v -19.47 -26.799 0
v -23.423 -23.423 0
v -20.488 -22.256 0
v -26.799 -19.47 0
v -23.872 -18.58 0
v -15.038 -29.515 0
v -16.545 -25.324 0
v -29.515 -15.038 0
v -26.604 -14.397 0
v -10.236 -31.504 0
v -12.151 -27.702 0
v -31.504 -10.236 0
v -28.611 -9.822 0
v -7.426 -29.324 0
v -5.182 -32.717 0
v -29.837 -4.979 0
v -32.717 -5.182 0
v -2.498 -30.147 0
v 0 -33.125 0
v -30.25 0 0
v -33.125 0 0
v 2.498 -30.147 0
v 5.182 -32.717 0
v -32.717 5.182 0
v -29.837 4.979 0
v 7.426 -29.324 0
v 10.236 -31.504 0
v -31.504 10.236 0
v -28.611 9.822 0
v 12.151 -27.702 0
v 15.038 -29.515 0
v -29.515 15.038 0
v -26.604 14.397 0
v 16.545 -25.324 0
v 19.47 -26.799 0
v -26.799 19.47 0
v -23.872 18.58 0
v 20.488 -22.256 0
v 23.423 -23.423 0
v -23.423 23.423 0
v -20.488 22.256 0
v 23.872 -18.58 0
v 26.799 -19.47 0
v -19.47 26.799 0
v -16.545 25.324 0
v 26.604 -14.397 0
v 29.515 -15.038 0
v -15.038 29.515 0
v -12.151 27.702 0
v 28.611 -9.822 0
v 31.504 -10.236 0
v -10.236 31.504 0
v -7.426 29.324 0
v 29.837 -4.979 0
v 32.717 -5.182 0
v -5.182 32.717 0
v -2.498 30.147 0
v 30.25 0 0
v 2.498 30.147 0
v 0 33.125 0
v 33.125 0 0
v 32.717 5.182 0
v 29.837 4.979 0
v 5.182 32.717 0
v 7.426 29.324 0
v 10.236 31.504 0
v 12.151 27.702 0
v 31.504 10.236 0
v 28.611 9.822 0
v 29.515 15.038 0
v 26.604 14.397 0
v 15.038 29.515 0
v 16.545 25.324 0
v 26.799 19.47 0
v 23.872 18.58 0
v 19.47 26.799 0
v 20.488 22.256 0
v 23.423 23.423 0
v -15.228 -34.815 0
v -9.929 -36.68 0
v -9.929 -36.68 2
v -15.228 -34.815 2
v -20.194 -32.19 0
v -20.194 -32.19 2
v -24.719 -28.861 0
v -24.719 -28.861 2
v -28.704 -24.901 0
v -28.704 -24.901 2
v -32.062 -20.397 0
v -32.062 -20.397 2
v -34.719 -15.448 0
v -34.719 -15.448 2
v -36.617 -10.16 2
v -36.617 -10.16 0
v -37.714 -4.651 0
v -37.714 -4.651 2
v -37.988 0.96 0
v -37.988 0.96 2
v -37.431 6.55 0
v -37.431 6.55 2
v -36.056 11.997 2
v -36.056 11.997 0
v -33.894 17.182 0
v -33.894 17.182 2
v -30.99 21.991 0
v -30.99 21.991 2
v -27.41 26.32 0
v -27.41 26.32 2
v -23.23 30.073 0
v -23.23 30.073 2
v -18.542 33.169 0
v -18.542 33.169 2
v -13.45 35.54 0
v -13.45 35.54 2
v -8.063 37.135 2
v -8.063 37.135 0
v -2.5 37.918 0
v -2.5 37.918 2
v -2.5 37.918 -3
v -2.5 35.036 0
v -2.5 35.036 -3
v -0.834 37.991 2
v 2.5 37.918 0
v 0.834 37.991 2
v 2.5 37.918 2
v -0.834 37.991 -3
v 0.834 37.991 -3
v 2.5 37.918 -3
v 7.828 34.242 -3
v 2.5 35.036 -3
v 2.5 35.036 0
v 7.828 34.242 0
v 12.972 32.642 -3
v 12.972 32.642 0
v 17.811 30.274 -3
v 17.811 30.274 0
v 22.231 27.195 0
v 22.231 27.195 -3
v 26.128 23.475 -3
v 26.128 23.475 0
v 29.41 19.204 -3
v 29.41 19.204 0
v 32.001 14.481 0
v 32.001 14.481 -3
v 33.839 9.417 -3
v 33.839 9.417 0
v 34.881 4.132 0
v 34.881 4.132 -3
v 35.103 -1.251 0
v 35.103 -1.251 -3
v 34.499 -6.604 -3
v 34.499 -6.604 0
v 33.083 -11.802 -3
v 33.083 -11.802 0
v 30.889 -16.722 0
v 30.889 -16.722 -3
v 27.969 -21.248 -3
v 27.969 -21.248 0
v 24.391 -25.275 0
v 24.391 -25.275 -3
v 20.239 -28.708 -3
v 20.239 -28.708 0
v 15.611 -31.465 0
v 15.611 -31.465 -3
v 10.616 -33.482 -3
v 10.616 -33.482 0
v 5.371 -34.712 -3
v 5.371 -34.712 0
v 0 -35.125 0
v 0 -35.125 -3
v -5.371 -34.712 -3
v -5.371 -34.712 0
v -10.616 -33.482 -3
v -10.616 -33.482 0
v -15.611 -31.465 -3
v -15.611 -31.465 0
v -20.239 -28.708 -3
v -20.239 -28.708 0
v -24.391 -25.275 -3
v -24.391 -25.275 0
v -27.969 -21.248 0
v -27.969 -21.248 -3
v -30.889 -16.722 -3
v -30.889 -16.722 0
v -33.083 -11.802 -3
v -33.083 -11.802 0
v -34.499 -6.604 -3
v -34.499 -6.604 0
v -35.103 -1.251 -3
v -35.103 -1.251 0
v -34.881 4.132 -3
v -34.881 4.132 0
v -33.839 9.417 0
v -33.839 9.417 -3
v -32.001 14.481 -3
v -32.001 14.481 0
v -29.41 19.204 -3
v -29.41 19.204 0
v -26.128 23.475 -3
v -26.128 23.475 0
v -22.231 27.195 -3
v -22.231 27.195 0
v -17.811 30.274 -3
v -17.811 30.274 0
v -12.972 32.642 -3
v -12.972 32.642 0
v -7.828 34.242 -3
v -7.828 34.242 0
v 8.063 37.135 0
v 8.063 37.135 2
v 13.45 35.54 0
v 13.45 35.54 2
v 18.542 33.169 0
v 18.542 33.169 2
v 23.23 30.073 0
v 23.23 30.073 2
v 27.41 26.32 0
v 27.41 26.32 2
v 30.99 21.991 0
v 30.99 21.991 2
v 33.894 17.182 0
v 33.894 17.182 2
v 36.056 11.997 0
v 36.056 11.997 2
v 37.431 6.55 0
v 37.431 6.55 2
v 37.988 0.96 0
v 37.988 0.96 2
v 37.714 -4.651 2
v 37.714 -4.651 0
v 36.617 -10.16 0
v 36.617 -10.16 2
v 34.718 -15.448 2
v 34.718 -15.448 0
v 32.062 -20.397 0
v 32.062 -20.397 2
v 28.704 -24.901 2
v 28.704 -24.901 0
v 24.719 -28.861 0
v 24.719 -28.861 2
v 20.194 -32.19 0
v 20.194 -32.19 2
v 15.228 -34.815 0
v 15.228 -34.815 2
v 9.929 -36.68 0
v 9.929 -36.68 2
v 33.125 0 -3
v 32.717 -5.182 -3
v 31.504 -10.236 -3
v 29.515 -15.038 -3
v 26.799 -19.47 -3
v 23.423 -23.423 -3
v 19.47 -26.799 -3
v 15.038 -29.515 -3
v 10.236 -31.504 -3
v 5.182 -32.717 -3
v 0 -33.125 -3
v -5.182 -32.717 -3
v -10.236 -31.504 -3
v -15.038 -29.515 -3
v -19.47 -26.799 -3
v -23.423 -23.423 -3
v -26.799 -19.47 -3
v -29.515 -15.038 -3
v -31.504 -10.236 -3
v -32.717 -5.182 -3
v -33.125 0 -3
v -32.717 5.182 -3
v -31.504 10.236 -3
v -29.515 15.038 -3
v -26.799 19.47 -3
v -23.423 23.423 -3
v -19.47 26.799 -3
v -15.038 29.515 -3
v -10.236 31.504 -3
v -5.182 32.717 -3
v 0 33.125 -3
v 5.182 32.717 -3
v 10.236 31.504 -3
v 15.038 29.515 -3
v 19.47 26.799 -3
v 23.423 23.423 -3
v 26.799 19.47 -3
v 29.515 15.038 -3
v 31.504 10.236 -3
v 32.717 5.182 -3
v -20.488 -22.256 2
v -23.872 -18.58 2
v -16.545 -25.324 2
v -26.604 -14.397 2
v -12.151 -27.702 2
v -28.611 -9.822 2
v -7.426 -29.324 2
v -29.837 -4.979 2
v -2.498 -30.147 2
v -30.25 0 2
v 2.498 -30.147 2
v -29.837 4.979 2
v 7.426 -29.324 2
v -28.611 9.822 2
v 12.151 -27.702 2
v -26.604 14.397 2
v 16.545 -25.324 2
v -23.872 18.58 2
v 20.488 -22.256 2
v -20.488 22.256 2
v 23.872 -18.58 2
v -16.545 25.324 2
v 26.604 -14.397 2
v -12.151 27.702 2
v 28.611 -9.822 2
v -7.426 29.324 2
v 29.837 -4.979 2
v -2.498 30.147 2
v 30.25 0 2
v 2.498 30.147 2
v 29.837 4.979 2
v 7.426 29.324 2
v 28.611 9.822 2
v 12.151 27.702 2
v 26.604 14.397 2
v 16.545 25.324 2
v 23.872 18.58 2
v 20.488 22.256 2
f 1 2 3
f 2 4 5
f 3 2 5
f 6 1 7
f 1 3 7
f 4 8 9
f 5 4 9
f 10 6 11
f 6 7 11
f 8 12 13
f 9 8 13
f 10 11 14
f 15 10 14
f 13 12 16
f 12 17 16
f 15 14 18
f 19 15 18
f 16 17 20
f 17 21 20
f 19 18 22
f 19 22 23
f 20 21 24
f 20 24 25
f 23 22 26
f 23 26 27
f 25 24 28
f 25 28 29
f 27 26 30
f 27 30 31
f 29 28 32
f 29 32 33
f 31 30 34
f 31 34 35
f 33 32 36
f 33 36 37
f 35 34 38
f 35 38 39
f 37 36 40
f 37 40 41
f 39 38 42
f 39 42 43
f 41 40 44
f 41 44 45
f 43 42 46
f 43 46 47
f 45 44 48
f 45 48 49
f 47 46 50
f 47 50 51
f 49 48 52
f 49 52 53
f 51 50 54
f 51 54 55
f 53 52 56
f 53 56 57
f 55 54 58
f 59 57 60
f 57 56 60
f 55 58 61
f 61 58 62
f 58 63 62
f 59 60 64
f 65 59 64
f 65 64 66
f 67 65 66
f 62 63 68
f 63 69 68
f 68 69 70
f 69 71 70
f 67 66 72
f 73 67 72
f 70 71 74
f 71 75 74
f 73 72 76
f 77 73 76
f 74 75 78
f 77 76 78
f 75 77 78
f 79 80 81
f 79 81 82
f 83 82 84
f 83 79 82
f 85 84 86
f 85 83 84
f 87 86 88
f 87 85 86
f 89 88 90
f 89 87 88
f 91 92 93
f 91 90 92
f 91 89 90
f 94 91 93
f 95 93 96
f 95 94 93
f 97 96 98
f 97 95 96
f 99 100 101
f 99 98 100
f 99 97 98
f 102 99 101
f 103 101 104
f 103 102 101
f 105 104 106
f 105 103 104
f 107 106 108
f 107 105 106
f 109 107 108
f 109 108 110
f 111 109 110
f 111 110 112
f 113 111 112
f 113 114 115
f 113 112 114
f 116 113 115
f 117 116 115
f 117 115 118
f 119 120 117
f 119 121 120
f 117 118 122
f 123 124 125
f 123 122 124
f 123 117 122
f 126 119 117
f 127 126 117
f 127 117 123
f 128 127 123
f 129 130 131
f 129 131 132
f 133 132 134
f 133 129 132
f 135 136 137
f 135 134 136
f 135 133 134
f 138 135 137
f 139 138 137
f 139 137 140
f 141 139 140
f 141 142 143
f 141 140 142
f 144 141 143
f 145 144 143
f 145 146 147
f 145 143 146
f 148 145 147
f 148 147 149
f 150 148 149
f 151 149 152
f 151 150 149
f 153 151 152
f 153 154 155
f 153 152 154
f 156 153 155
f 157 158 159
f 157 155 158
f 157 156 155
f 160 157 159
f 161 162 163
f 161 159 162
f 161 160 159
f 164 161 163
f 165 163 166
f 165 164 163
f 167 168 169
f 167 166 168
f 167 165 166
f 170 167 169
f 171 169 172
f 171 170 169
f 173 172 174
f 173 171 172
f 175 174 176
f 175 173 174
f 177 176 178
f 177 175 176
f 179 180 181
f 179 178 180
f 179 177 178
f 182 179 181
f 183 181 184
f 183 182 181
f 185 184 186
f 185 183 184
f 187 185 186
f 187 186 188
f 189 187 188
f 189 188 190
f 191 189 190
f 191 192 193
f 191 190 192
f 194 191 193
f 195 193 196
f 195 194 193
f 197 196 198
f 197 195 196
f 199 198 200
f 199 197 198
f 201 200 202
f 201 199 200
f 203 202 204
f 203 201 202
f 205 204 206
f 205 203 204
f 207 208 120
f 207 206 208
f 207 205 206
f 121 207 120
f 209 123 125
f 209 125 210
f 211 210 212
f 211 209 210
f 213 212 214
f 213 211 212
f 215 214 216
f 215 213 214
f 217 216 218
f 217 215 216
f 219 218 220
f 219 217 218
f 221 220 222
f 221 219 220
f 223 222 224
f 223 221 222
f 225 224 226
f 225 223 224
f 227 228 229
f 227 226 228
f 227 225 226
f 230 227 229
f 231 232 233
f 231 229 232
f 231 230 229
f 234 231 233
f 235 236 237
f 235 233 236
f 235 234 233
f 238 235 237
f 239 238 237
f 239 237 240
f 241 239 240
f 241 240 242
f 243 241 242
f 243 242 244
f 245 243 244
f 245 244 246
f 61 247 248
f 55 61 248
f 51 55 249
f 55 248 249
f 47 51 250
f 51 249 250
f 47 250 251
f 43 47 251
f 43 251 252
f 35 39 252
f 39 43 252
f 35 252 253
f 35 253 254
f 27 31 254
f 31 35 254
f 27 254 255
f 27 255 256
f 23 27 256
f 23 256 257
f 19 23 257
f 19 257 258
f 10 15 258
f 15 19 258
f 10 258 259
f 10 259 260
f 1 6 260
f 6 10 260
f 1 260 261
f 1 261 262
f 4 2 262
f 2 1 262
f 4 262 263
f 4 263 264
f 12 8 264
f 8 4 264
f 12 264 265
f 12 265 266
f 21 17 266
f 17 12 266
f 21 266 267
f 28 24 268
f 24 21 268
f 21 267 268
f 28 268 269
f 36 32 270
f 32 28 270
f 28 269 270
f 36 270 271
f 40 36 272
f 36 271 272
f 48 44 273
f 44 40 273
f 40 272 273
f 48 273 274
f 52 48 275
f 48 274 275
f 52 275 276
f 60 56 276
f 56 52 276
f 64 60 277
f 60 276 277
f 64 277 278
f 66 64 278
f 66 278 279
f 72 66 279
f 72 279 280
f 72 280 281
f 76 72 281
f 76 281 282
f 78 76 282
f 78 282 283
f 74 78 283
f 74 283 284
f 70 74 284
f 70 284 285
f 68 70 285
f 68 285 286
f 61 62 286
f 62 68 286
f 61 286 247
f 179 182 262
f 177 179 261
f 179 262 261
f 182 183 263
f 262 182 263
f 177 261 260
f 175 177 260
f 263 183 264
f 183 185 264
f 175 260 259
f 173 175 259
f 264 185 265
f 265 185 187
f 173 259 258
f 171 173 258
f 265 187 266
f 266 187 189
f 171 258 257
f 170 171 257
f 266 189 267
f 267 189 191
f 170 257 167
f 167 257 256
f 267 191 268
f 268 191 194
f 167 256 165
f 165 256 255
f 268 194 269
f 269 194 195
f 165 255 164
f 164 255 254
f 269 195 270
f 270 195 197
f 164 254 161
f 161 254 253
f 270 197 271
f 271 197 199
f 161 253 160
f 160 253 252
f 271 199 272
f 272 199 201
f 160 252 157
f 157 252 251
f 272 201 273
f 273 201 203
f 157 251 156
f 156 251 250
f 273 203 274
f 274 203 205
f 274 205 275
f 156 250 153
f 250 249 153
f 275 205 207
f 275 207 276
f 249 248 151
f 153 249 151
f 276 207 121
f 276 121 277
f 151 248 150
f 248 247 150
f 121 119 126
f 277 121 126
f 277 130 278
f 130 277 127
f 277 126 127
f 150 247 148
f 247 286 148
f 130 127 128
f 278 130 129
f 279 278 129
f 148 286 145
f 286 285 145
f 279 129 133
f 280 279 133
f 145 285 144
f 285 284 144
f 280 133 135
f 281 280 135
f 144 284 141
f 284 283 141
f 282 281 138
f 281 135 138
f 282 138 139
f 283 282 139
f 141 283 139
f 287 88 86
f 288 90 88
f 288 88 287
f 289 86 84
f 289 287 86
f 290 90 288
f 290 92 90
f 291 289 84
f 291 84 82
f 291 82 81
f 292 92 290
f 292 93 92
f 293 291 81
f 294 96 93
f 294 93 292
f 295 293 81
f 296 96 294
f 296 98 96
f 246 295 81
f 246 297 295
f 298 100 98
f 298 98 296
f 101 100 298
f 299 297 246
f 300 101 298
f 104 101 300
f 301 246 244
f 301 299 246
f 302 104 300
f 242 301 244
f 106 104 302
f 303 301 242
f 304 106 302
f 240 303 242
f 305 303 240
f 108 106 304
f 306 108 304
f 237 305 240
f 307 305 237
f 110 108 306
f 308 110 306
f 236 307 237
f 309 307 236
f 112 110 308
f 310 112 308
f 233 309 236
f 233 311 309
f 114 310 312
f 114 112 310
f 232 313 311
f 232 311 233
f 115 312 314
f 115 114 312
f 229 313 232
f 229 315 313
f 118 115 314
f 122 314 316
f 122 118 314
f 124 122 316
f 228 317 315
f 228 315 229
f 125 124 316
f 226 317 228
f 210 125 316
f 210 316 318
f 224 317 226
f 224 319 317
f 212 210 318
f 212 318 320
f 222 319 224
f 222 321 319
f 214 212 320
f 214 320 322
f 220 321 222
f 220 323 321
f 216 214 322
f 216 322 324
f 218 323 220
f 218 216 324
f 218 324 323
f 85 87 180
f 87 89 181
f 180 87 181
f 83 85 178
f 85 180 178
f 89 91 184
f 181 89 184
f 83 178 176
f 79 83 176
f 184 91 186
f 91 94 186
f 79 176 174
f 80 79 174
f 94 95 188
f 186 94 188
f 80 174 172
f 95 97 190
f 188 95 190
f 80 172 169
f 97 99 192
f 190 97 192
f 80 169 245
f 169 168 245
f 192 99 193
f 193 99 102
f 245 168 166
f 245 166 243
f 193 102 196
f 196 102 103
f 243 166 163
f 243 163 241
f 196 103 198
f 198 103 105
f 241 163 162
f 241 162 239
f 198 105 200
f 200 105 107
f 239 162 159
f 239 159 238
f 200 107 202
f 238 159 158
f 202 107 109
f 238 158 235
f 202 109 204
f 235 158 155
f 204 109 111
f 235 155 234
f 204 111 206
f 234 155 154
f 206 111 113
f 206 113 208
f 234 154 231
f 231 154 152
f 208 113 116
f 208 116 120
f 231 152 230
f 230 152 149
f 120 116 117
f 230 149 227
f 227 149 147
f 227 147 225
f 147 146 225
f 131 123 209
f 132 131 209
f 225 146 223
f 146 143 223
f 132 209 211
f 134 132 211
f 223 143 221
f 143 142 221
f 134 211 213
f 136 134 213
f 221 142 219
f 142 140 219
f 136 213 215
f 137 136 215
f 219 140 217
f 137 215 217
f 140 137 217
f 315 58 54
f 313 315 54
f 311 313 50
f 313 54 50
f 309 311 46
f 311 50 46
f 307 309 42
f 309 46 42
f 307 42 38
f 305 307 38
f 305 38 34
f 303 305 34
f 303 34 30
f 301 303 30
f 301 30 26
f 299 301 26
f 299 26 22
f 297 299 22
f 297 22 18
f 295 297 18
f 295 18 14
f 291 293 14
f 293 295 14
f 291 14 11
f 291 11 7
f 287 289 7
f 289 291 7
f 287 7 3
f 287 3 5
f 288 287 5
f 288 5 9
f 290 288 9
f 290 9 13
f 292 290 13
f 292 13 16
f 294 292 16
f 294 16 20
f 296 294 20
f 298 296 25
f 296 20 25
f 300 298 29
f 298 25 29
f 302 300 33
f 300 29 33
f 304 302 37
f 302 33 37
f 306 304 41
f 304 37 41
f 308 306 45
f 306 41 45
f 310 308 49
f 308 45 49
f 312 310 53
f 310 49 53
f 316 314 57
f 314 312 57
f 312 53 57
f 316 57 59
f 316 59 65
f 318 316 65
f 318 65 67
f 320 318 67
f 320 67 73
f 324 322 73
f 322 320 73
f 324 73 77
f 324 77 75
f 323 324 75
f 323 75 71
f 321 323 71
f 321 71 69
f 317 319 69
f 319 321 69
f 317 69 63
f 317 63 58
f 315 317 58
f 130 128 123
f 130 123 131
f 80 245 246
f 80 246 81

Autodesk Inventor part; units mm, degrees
ref_plane "YZ Plane" through (0, 0, 0) normal (1, 0, 0) x (0, 1, 0)
ref_plane "РабПлоскость1" through (0, 0, -3) normal (0, 0, 1) x (1, 0, 0)
sketch "Эскиз1" plane through (0, 0, -3) normal (0, 0, 1) x (1, 0, 0)
  circle A0 centre (0, 0) radius 33.125 projected
  arc A1 (-2.5, 35.0359) -> (2.5, 35.0359) centre (0, 0) ccw projected
  line L0 (2.5, 37.9177) -> (2.5, 35.0359)
  line L1 (-2.5, 35.0359) -> (-2.5, 37.9177)
  arc A2 (2.5, 37.9177) -> (-2.5, 37.9177) centre (0, 0) ccw
  point P0 (2.5, 35.0359)
ref_plane "РабПлоскость2" through (-38, -36.68, 0) normal (0, 0, 1) x (1, 0, 0)
extrude "Выдавливание1" add sketch "Эскиз1" along normal up to surface (3 mm away)
sketch "Эскиз2" plane through (0, 0, 0) normal (0, 0, 1) x (1, 0, 0)
  circle A0 centre (0, 0) radius 30.25 projected
  arc A1 (-2.5, 37.9177) -> (-9.9286, -36.68) centre (0, 0) ccw projected
  arc A2 (9.9286, -36.68) -> (2.5, 37.9177) centre (0, 0) ccw projected
  arc A3 (2.5, 37.9177) -> (-2.5, 37.9177) centre (0, 0) ccw
  line L0 (9.9286, -36.68) -> (-9.9286, -36.68)
  point P0 (-2.5, 37.9177)
extrude "Выдавливание2" add sketch "Эскиз2" along normal blind 2
properties part number "ring"
